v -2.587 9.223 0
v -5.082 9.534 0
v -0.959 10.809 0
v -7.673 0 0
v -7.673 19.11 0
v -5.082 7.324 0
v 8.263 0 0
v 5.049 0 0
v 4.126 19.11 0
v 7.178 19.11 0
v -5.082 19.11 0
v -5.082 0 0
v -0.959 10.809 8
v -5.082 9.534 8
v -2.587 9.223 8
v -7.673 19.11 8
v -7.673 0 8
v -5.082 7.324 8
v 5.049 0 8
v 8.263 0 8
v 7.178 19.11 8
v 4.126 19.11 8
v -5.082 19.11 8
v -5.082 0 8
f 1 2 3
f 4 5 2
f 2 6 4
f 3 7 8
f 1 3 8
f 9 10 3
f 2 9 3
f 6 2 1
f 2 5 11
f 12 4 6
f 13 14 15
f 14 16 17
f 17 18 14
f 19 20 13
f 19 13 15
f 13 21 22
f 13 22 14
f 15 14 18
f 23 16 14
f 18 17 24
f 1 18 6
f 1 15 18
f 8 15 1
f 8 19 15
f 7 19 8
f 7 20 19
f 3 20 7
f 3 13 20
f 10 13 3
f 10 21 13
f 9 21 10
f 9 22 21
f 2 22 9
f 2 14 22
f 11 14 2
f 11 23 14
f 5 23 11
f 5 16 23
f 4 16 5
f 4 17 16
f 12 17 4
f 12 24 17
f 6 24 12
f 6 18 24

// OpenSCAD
linear_extrude(height=8){
text("K", halign="center", size=20, spacing=1.1);
}
